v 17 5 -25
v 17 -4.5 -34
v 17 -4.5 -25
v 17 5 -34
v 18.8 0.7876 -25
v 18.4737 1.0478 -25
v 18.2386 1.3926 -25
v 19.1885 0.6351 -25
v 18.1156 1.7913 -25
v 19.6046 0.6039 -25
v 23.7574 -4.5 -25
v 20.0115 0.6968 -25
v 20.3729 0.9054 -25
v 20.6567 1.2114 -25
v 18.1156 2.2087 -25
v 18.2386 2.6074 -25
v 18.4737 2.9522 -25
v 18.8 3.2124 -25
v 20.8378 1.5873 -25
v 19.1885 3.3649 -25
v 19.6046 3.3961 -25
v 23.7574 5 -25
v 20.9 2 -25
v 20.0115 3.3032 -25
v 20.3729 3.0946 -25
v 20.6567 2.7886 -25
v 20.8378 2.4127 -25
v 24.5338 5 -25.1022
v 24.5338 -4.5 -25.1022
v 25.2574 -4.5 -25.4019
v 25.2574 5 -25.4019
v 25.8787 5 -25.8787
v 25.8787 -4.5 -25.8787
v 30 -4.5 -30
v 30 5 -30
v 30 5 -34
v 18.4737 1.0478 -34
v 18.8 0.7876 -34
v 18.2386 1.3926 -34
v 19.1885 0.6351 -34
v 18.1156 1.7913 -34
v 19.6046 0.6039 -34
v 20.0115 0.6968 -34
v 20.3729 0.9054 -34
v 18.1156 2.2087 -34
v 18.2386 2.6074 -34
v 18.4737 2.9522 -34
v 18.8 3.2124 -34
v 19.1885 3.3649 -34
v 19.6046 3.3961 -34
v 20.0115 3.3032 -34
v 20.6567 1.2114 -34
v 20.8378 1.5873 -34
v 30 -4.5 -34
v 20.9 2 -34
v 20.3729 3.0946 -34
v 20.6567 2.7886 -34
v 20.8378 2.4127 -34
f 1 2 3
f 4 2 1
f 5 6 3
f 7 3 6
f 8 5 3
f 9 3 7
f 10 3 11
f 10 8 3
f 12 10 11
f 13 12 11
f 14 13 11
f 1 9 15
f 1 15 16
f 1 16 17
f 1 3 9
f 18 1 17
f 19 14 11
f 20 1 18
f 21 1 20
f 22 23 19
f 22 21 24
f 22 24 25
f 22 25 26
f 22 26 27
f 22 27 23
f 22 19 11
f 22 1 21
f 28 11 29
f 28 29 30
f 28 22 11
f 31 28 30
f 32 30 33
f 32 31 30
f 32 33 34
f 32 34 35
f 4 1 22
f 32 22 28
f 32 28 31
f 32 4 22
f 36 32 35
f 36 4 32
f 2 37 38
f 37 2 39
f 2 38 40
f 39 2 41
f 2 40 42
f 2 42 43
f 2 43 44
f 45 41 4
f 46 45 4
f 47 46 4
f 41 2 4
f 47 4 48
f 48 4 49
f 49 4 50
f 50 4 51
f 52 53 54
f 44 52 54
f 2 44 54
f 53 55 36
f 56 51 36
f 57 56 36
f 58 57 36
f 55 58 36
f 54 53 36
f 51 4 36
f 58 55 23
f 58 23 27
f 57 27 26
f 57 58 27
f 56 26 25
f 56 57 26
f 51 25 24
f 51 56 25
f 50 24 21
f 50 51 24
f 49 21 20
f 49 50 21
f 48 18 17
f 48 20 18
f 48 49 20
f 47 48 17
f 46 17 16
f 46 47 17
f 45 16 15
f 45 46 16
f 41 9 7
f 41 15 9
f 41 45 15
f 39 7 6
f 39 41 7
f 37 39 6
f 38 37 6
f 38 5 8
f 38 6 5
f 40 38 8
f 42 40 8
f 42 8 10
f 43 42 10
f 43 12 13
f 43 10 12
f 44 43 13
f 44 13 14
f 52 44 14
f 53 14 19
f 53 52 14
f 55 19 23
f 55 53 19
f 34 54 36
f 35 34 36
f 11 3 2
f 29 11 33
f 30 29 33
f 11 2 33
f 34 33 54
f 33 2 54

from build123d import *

# Parameters (mm, degrees)
BOX001027045162_W     = 17
BOX001027045162_H     = 18
BOX001027045162_DEPTH = 16
CYLINDER208_R         = 1.4
CYLINDER208_DEPTH     = 30
BOX001027045158_W     = 33
BOX001027045158_H     = 16
BOX001027045158_DEPTH = 10
BOX001027045156_W     = 21
BOX001027045156_H     = 9.5
BOX001027045156_DEPTH = 10
CHAMFER018_SIZE       = 5
FILLET026_R           = 3


with BuildPart() as cube210:
    # Box001027045162 → Box001027045162 (new body)
    with BuildSketch(Plane(origin=(0, -8, -36), x_dir=(1, 0, 0), z_dir=(0, 0, 1))):
        with Locations((8.5, 9)):
            Rectangle(BOX001027045162_W, BOX001027045162_H)
    extrude(amount=BOX001027045162_DEPTH)


with BuildPart() as cylinder252:
    # Cylinder208 → Cylinder208 (new body)
    with BuildSketch(Plane(origin=(19.5, 2, -45), x_dir=(1, 0, 0), z_dir=(0, 0, 1))):
        Circle(CYLINDER208_R)
    extrude(amount=CYLINDER208_DEPTH)


with BuildPart() as cube206:
    # Box001027045158 → Box001027045158 (new body)
    with BuildSketch(Plane(origin=(0, -7, -44), x_dir=(1, 0, 0), z_dir=(0, 0, 1))):
        with Locations((16.5, 8)):
            Rectangle(BOX001027045158_W, BOX001027045158_H)
    extrude(amount=BOX001027045158_DEPTH)


with BuildPart() as adjust_block:
    # Box001027045156 → Box001027045156 (new body)
    with BuildSketch(Plane(origin=(20, -2.5, -42), x_dir=(1, 0, 0), z_dir=(0, 0, 1))):
        with Locations((10.5, 4.75)):
            Rectangle(BOX001027045156_W, BOX001027045156_H)
    extrude(amount=BOX001027045156_DEPTH)

    # Chamfer018
    chamfer018_edges = [adjust_block.edges().sort_by_distance(p)[0] for p in [
        (20, 2.25, -32),
        (41, 2.25, -32),
    ]]
    chamfer(chamfer018_edges, length=CHAMFER018_SIZE)

    # Fillet026
    fillet026_edges = [adjust_block.edges().sort_by_distance(p)[0] for p in [
        (25, 2.25, -32),
        (36, 2.25, -32),
    ]]
    fillet(fillet026_edges, radius=FILLET026_R)


with BuildPart() as adjust_block_1:
    # Fillet026 placement: moved
    add(adjust_block.part.moved(Location((-11, -2, 7))))

    # Cut181: cut Cube206
    add(cube206.part, mode=Mode.SUBTRACT)

    # Cut183: cut Cylinder252
    add(cylinder252.part, mode=Mode.SUBTRACT)

    # Cut188: cut Cube210
    add(cube210.part, mode=Mode.SUBTRACT)


solid = adjust_block_1.part
